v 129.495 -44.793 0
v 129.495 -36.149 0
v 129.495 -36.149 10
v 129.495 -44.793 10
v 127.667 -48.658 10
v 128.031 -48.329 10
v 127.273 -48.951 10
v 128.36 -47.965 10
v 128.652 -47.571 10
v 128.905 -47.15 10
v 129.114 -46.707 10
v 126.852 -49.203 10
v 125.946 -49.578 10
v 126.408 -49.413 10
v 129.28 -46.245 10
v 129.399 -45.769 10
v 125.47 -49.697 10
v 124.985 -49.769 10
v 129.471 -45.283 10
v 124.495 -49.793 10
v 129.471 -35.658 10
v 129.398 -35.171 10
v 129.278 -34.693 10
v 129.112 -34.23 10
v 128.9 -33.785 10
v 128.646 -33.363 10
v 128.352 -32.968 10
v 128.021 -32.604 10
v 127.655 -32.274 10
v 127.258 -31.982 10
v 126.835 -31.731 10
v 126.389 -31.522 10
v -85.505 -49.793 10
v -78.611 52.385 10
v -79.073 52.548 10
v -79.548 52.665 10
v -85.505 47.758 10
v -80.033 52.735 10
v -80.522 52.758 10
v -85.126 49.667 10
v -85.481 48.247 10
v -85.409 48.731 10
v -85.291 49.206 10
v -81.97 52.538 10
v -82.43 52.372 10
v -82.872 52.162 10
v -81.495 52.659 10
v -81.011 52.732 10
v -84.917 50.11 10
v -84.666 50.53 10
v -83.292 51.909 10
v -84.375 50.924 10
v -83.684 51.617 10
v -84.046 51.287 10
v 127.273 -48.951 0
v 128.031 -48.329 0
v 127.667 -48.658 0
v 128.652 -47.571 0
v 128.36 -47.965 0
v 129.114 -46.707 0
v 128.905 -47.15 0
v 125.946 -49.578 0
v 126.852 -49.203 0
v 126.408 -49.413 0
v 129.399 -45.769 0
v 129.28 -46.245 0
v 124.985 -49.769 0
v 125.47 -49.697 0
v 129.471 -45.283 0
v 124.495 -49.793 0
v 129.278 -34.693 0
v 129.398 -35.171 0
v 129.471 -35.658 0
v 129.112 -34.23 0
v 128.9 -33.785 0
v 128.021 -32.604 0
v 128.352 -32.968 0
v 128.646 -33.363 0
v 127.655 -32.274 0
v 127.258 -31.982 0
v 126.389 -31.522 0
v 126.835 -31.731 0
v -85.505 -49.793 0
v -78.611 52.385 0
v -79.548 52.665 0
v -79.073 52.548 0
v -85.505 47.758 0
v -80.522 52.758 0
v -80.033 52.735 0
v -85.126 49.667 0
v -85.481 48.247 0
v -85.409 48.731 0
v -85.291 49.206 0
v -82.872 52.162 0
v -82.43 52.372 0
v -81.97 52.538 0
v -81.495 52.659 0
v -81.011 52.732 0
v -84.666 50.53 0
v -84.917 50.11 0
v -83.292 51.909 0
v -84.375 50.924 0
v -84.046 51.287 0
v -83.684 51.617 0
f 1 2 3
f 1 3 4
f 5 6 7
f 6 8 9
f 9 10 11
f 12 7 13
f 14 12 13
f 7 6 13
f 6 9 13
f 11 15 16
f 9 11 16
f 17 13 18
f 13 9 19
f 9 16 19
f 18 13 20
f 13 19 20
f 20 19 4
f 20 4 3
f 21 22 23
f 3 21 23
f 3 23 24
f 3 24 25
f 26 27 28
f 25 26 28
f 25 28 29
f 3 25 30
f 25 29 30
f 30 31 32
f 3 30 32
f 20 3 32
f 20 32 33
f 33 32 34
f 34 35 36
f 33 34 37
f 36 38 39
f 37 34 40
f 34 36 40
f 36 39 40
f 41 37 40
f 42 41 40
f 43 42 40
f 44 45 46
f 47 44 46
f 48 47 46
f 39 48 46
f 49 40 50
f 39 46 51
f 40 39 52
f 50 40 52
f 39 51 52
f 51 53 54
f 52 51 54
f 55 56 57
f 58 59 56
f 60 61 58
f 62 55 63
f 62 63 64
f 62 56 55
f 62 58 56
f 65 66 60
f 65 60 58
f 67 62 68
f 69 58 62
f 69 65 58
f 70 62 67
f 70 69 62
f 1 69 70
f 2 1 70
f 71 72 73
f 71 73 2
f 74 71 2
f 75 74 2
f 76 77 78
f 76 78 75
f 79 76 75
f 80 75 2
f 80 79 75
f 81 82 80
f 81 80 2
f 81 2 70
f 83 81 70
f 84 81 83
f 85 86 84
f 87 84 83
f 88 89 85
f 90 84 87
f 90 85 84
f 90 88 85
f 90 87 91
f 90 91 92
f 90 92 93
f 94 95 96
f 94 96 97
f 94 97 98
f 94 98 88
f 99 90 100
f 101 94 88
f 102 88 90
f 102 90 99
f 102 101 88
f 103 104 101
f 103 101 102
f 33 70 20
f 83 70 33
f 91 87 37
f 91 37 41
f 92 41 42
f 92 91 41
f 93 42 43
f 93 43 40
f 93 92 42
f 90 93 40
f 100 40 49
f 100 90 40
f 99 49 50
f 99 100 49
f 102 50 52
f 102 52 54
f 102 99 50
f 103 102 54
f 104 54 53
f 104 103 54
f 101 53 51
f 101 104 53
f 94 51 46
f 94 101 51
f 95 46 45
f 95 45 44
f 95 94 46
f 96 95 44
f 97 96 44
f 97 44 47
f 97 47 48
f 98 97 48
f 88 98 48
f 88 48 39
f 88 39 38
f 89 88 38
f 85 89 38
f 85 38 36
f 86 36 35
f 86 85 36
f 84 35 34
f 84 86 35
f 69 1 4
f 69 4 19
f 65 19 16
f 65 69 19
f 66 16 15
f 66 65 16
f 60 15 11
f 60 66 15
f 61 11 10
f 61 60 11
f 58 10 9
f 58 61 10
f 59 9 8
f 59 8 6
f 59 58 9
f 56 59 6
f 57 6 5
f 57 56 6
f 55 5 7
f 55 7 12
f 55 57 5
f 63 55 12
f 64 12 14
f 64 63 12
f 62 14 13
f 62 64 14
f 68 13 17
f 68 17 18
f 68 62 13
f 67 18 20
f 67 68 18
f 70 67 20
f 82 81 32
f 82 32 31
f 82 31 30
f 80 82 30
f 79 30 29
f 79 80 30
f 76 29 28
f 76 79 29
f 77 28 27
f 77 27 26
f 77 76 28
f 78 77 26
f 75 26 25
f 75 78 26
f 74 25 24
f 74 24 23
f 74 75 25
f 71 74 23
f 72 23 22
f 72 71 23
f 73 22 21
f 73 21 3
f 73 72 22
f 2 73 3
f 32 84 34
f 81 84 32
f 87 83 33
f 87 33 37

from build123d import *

# Parameters (mm, degrees)
BOSS_EXTRUDE1_DEPTH = 10


with BuildPart() as part:
    # Sketch1 → Boss-Extrude1 (new body)
    with BuildSketch(Plane.XY):
        with BuildLine():
            Line((-78.611020919, 52.384922135), (126.388979081, -31.522054609))
            ThreePointArc((126.388979081, -31.522054609), (128.646483258, -33.362872526), (129.494976829, -36.149446474))
            Line((129.494976829, -36.149446474), (129.494976829, -44.793346711))
            ThreePointArc((129.494976829, -44.793346711), (128.030510735, -48.328880617), (124.494976829, -49.793346711))
            Line((124.494976829, -49.793346711), (-85.505023171, -49.793346711))
            Line((-85.505023171, -49.793346711), (-85.505023171, 47.75753027))
            ThreePointArc((-85.505023171, 47.75753027), (-83.29159712, 51.909036699), (-78.611020919, 52.384922135))
        make_face()
    extrude(amount=BOSS_EXTRUDE1_DEPTH)


solid = part.part
